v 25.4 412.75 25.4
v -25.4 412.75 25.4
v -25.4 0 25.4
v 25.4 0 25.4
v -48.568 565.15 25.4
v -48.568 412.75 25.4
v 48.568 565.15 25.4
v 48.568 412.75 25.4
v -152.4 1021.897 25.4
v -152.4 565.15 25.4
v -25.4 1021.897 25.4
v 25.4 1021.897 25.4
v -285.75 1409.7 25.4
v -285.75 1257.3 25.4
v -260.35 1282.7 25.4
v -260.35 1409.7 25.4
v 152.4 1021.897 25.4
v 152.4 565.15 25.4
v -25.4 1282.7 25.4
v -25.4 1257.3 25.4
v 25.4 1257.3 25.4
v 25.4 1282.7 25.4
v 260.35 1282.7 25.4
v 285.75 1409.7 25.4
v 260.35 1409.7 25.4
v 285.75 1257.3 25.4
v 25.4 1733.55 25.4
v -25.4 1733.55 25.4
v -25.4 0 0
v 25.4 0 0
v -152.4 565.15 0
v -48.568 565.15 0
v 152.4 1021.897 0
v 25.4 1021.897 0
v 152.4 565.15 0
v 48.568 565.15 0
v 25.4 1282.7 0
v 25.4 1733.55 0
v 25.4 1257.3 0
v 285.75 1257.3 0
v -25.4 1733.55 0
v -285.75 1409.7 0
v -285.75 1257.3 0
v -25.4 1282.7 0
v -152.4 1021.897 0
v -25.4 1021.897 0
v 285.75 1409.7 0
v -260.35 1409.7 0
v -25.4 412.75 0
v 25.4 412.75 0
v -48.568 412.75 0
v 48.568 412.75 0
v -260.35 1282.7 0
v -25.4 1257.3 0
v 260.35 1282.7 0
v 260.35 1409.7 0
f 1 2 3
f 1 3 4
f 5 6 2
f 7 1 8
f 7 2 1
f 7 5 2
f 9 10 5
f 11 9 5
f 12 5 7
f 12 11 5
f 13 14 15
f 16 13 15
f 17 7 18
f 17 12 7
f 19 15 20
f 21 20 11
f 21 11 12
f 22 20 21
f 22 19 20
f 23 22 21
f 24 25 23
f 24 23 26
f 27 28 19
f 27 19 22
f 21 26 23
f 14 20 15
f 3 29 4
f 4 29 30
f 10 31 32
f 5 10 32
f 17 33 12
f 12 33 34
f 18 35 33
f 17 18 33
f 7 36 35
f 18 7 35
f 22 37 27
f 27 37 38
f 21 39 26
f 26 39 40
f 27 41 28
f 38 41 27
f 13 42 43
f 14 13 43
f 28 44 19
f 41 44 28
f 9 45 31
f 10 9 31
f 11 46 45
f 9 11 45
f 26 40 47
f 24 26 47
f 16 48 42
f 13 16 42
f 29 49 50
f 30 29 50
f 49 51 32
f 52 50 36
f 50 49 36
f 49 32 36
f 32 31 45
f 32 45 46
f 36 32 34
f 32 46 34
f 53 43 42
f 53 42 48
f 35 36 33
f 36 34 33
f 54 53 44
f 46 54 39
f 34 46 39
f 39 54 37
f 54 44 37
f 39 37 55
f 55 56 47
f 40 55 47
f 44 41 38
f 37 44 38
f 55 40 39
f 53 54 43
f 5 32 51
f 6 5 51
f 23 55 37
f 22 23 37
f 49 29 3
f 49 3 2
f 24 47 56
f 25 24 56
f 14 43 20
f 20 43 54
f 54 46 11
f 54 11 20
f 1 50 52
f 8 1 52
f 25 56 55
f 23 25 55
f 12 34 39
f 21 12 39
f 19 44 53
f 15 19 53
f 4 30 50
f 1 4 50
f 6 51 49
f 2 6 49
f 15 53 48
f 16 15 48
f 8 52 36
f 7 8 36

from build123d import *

# Parameters (mm, degrees)
F0_W     = 50.8
F0_H     = 412.75
F0_W_2   = 23.167712307
F0_H_2   = 152.4
F0_H_3   = 69.3220067978
F0_H_4   = 387.4254058838
F0_H_5   = 235.4025873184
F0_H_6   = 25.4
F0_H_7   = 450.85
F1_DEPTH = 25.4


with BuildPart() as f1:
    # F0 (on Top) → F1 (new body)
    with BuildSketch(Plane.XY):
        with Locations((0, 206.375)):
            Rectangle(F0_W, F0_H)
        with Locations((-36.9838561535, 488.95)):
            Rectangle(F0_W_2, F0_H_2)
        with Locations((0, 488.95)):
            Rectangle(F0_W, F0_H_2)
        with Locations((36.9838561535, 488.95)):
            Rectangle(F0_W_2, F0_H_2)
        with Locations((-36.9838561535, 599.8110033989)):
            Rectangle(F0_W_2, F0_H_3)
        with Locations((36.9838561535, 599.8110033989)):
            Rectangle(F0_W_2, F0_H_3)
        Polygon((-48.567712307, 634.4720067978), (-25.4, 634.4720067978), (-25.4, 1021.8974126816), (-152.4, 1021.8974126816), (-152.4, 565.15), (-48.567712307, 565.15), align=None)
        with Locations((0, 828.1847097397)):
            Rectangle(F0_W, F0_H_4)
        Polygon((25.4, 1021.8974126816), (25.4, 634.4720067978), (48.567712307, 634.4720067978), (48.567712307, 565.15), (152.4, 565.15), (152.4, 1021.8974126816), align=None)
        with Locations((0, 1139.5987063408)):
            Rectangle(F0_W, F0_H_5)
        Polygon((-285.75, 1257.3), (-25.4, 1257.3), (-25.4, 1282.7), (-260.35, 1282.7), (-260.35, 1409.7), (-285.75, 1409.7), align=None)
        with Locations((0, 1270)):
            Rectangle(F0_W, F0_H_6)
        Polygon((25.4, 1282.7), (25.4, 1257.3), (285.75, 1257.3), (285.75, 1409.7), (260.35, 1409.7), (260.35, 1282.7), align=None)
        with Locations((0, 1508.125)):
            Rectangle(F0_W, F0_H_7)
        with Locations((0, 599.8110033989)):
            Rectangle(F0_W, F0_H_3)
    extrude(amount=F1_DEPTH)


solid = f1.part
